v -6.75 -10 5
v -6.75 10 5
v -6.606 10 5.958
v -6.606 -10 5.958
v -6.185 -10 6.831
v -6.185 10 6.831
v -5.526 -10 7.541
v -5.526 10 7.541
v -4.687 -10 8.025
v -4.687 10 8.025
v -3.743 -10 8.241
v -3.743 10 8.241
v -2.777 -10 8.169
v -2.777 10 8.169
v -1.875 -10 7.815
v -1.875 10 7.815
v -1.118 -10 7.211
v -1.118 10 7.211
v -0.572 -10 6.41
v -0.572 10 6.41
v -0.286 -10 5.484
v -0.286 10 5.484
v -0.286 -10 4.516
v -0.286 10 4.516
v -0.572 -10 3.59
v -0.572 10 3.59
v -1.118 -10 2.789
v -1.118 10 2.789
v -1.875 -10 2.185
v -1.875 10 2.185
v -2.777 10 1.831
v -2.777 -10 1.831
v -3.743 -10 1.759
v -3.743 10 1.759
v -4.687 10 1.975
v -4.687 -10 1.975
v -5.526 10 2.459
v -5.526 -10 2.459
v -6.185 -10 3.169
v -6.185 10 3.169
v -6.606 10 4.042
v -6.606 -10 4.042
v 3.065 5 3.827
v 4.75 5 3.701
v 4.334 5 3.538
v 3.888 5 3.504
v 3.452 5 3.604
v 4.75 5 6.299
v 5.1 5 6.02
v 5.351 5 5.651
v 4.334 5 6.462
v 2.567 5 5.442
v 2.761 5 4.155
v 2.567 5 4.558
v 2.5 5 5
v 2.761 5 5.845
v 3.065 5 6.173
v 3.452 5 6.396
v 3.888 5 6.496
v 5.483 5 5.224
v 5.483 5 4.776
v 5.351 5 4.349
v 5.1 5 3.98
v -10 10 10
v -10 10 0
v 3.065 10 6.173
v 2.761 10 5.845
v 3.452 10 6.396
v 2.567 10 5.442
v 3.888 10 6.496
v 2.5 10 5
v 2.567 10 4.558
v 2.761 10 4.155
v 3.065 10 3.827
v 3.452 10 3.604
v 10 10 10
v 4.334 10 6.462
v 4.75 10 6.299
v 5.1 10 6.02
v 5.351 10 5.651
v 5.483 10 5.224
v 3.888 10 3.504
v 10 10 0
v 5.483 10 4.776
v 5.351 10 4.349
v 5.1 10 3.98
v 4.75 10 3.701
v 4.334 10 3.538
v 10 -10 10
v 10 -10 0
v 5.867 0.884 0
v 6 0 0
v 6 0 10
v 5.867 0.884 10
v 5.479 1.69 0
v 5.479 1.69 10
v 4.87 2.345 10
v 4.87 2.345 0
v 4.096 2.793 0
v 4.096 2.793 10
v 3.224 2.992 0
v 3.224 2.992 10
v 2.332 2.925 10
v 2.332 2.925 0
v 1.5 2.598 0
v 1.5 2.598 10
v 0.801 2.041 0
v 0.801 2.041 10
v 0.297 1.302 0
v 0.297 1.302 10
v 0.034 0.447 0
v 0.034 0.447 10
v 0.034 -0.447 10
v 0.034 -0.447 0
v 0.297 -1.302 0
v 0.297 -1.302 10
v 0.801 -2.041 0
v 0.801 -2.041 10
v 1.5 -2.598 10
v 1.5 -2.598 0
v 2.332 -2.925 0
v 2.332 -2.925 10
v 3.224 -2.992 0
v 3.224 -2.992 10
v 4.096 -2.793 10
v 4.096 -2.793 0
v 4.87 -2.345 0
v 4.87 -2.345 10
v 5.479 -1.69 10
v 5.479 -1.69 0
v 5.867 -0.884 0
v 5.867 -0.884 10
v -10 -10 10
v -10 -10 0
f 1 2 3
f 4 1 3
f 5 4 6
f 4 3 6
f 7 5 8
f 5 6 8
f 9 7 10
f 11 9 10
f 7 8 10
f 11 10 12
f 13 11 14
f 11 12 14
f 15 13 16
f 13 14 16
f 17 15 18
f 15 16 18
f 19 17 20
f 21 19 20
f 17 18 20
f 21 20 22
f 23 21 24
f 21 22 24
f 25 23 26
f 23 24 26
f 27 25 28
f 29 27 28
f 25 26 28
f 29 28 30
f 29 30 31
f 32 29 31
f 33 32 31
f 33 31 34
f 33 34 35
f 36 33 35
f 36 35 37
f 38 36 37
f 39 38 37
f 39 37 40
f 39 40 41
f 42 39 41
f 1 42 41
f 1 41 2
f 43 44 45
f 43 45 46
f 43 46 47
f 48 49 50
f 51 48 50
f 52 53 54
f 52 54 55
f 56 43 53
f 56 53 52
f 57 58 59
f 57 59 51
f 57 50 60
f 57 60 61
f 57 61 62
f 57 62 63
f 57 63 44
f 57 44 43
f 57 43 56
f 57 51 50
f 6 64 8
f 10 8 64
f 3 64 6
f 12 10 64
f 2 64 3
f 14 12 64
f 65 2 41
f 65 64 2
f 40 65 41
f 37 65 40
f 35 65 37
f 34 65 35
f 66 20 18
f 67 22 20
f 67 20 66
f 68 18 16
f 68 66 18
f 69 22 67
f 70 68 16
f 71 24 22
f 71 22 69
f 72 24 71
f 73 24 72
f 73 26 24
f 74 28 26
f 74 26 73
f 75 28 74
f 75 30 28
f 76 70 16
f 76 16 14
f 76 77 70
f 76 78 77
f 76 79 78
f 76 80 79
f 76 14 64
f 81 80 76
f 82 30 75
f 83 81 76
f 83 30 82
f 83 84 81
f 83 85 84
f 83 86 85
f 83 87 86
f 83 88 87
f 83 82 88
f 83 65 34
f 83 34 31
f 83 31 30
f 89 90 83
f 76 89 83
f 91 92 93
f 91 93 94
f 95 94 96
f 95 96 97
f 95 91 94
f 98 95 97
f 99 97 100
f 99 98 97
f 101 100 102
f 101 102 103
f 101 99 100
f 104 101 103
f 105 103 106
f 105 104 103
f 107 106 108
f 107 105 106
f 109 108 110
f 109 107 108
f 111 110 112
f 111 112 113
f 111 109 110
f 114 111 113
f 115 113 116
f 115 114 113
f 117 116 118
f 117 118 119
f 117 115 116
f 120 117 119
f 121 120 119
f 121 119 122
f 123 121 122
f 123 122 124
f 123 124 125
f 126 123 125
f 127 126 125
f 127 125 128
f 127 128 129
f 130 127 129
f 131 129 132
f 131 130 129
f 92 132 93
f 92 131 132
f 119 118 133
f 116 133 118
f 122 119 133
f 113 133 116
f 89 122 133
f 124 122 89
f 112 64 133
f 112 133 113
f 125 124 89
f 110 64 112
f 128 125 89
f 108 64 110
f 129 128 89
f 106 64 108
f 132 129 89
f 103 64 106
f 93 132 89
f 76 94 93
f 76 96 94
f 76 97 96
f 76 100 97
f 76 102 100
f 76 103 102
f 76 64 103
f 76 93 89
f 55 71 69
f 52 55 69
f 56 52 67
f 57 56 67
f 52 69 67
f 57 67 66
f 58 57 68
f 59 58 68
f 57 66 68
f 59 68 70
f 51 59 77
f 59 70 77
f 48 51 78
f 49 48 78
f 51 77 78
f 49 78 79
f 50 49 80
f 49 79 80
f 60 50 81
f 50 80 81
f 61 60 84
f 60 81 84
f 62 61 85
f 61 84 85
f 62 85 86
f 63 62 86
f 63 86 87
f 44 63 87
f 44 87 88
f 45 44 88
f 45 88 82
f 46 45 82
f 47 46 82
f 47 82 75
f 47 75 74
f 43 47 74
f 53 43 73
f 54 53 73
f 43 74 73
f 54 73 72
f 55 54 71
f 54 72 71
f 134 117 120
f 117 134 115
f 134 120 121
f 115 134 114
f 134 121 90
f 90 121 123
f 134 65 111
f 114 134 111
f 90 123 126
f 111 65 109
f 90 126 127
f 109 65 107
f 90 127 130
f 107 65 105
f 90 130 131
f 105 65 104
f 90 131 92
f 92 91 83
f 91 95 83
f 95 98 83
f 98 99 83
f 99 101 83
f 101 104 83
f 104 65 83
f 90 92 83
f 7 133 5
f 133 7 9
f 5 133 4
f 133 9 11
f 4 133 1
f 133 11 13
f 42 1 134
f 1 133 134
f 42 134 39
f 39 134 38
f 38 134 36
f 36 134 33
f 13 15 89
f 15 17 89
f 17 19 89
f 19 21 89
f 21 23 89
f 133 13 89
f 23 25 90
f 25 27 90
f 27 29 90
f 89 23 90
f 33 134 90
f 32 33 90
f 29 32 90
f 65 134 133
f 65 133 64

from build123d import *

# Parameters (mm, degrees)
F0_W     = 20
F0_H     = 20
F0_R     = 3
F1_DEPTH = 10
F2_R     = 3.25
F3_DEPTH = 20.001
F2_R_2   = 1.5
F4_DEPTH = 5


with BuildPart() as f1:
    # F0 (on Top) → F1 (new body)
    with BuildSketch(Plane.XY):
        Rectangle(F0_W, F0_H)
        with Locations((3, 0)):
            Circle(F0_R, mode=Mode.SUBTRACT)
    extrude(amount=F1_DEPTH)

    # F2 (on face) → F3 (cut, through all)
    with BuildSketch(Plane(origin=(0, 10, 0), x_dir=(-1, 0, 0), z_dir=(0, 1, 0))):
        with Locations((3.5, 5)):
            Circle(F2_R)
    extrude(amount=-F3_DEPTH, mode=Mode.SUBTRACT)

    # F2 (on face) → F4 (cut)
    with BuildSketch(Plane(origin=(0, 10, 0), x_dir=(-1, 0, 0), z_dir=(0, 1, 0))):
        with Locations((-4, 5)):
            Circle(F2_R_2)
    extrude(amount=-F4_DEPTH, mode=Mode.SUBTRACT)


solid = f1.part
